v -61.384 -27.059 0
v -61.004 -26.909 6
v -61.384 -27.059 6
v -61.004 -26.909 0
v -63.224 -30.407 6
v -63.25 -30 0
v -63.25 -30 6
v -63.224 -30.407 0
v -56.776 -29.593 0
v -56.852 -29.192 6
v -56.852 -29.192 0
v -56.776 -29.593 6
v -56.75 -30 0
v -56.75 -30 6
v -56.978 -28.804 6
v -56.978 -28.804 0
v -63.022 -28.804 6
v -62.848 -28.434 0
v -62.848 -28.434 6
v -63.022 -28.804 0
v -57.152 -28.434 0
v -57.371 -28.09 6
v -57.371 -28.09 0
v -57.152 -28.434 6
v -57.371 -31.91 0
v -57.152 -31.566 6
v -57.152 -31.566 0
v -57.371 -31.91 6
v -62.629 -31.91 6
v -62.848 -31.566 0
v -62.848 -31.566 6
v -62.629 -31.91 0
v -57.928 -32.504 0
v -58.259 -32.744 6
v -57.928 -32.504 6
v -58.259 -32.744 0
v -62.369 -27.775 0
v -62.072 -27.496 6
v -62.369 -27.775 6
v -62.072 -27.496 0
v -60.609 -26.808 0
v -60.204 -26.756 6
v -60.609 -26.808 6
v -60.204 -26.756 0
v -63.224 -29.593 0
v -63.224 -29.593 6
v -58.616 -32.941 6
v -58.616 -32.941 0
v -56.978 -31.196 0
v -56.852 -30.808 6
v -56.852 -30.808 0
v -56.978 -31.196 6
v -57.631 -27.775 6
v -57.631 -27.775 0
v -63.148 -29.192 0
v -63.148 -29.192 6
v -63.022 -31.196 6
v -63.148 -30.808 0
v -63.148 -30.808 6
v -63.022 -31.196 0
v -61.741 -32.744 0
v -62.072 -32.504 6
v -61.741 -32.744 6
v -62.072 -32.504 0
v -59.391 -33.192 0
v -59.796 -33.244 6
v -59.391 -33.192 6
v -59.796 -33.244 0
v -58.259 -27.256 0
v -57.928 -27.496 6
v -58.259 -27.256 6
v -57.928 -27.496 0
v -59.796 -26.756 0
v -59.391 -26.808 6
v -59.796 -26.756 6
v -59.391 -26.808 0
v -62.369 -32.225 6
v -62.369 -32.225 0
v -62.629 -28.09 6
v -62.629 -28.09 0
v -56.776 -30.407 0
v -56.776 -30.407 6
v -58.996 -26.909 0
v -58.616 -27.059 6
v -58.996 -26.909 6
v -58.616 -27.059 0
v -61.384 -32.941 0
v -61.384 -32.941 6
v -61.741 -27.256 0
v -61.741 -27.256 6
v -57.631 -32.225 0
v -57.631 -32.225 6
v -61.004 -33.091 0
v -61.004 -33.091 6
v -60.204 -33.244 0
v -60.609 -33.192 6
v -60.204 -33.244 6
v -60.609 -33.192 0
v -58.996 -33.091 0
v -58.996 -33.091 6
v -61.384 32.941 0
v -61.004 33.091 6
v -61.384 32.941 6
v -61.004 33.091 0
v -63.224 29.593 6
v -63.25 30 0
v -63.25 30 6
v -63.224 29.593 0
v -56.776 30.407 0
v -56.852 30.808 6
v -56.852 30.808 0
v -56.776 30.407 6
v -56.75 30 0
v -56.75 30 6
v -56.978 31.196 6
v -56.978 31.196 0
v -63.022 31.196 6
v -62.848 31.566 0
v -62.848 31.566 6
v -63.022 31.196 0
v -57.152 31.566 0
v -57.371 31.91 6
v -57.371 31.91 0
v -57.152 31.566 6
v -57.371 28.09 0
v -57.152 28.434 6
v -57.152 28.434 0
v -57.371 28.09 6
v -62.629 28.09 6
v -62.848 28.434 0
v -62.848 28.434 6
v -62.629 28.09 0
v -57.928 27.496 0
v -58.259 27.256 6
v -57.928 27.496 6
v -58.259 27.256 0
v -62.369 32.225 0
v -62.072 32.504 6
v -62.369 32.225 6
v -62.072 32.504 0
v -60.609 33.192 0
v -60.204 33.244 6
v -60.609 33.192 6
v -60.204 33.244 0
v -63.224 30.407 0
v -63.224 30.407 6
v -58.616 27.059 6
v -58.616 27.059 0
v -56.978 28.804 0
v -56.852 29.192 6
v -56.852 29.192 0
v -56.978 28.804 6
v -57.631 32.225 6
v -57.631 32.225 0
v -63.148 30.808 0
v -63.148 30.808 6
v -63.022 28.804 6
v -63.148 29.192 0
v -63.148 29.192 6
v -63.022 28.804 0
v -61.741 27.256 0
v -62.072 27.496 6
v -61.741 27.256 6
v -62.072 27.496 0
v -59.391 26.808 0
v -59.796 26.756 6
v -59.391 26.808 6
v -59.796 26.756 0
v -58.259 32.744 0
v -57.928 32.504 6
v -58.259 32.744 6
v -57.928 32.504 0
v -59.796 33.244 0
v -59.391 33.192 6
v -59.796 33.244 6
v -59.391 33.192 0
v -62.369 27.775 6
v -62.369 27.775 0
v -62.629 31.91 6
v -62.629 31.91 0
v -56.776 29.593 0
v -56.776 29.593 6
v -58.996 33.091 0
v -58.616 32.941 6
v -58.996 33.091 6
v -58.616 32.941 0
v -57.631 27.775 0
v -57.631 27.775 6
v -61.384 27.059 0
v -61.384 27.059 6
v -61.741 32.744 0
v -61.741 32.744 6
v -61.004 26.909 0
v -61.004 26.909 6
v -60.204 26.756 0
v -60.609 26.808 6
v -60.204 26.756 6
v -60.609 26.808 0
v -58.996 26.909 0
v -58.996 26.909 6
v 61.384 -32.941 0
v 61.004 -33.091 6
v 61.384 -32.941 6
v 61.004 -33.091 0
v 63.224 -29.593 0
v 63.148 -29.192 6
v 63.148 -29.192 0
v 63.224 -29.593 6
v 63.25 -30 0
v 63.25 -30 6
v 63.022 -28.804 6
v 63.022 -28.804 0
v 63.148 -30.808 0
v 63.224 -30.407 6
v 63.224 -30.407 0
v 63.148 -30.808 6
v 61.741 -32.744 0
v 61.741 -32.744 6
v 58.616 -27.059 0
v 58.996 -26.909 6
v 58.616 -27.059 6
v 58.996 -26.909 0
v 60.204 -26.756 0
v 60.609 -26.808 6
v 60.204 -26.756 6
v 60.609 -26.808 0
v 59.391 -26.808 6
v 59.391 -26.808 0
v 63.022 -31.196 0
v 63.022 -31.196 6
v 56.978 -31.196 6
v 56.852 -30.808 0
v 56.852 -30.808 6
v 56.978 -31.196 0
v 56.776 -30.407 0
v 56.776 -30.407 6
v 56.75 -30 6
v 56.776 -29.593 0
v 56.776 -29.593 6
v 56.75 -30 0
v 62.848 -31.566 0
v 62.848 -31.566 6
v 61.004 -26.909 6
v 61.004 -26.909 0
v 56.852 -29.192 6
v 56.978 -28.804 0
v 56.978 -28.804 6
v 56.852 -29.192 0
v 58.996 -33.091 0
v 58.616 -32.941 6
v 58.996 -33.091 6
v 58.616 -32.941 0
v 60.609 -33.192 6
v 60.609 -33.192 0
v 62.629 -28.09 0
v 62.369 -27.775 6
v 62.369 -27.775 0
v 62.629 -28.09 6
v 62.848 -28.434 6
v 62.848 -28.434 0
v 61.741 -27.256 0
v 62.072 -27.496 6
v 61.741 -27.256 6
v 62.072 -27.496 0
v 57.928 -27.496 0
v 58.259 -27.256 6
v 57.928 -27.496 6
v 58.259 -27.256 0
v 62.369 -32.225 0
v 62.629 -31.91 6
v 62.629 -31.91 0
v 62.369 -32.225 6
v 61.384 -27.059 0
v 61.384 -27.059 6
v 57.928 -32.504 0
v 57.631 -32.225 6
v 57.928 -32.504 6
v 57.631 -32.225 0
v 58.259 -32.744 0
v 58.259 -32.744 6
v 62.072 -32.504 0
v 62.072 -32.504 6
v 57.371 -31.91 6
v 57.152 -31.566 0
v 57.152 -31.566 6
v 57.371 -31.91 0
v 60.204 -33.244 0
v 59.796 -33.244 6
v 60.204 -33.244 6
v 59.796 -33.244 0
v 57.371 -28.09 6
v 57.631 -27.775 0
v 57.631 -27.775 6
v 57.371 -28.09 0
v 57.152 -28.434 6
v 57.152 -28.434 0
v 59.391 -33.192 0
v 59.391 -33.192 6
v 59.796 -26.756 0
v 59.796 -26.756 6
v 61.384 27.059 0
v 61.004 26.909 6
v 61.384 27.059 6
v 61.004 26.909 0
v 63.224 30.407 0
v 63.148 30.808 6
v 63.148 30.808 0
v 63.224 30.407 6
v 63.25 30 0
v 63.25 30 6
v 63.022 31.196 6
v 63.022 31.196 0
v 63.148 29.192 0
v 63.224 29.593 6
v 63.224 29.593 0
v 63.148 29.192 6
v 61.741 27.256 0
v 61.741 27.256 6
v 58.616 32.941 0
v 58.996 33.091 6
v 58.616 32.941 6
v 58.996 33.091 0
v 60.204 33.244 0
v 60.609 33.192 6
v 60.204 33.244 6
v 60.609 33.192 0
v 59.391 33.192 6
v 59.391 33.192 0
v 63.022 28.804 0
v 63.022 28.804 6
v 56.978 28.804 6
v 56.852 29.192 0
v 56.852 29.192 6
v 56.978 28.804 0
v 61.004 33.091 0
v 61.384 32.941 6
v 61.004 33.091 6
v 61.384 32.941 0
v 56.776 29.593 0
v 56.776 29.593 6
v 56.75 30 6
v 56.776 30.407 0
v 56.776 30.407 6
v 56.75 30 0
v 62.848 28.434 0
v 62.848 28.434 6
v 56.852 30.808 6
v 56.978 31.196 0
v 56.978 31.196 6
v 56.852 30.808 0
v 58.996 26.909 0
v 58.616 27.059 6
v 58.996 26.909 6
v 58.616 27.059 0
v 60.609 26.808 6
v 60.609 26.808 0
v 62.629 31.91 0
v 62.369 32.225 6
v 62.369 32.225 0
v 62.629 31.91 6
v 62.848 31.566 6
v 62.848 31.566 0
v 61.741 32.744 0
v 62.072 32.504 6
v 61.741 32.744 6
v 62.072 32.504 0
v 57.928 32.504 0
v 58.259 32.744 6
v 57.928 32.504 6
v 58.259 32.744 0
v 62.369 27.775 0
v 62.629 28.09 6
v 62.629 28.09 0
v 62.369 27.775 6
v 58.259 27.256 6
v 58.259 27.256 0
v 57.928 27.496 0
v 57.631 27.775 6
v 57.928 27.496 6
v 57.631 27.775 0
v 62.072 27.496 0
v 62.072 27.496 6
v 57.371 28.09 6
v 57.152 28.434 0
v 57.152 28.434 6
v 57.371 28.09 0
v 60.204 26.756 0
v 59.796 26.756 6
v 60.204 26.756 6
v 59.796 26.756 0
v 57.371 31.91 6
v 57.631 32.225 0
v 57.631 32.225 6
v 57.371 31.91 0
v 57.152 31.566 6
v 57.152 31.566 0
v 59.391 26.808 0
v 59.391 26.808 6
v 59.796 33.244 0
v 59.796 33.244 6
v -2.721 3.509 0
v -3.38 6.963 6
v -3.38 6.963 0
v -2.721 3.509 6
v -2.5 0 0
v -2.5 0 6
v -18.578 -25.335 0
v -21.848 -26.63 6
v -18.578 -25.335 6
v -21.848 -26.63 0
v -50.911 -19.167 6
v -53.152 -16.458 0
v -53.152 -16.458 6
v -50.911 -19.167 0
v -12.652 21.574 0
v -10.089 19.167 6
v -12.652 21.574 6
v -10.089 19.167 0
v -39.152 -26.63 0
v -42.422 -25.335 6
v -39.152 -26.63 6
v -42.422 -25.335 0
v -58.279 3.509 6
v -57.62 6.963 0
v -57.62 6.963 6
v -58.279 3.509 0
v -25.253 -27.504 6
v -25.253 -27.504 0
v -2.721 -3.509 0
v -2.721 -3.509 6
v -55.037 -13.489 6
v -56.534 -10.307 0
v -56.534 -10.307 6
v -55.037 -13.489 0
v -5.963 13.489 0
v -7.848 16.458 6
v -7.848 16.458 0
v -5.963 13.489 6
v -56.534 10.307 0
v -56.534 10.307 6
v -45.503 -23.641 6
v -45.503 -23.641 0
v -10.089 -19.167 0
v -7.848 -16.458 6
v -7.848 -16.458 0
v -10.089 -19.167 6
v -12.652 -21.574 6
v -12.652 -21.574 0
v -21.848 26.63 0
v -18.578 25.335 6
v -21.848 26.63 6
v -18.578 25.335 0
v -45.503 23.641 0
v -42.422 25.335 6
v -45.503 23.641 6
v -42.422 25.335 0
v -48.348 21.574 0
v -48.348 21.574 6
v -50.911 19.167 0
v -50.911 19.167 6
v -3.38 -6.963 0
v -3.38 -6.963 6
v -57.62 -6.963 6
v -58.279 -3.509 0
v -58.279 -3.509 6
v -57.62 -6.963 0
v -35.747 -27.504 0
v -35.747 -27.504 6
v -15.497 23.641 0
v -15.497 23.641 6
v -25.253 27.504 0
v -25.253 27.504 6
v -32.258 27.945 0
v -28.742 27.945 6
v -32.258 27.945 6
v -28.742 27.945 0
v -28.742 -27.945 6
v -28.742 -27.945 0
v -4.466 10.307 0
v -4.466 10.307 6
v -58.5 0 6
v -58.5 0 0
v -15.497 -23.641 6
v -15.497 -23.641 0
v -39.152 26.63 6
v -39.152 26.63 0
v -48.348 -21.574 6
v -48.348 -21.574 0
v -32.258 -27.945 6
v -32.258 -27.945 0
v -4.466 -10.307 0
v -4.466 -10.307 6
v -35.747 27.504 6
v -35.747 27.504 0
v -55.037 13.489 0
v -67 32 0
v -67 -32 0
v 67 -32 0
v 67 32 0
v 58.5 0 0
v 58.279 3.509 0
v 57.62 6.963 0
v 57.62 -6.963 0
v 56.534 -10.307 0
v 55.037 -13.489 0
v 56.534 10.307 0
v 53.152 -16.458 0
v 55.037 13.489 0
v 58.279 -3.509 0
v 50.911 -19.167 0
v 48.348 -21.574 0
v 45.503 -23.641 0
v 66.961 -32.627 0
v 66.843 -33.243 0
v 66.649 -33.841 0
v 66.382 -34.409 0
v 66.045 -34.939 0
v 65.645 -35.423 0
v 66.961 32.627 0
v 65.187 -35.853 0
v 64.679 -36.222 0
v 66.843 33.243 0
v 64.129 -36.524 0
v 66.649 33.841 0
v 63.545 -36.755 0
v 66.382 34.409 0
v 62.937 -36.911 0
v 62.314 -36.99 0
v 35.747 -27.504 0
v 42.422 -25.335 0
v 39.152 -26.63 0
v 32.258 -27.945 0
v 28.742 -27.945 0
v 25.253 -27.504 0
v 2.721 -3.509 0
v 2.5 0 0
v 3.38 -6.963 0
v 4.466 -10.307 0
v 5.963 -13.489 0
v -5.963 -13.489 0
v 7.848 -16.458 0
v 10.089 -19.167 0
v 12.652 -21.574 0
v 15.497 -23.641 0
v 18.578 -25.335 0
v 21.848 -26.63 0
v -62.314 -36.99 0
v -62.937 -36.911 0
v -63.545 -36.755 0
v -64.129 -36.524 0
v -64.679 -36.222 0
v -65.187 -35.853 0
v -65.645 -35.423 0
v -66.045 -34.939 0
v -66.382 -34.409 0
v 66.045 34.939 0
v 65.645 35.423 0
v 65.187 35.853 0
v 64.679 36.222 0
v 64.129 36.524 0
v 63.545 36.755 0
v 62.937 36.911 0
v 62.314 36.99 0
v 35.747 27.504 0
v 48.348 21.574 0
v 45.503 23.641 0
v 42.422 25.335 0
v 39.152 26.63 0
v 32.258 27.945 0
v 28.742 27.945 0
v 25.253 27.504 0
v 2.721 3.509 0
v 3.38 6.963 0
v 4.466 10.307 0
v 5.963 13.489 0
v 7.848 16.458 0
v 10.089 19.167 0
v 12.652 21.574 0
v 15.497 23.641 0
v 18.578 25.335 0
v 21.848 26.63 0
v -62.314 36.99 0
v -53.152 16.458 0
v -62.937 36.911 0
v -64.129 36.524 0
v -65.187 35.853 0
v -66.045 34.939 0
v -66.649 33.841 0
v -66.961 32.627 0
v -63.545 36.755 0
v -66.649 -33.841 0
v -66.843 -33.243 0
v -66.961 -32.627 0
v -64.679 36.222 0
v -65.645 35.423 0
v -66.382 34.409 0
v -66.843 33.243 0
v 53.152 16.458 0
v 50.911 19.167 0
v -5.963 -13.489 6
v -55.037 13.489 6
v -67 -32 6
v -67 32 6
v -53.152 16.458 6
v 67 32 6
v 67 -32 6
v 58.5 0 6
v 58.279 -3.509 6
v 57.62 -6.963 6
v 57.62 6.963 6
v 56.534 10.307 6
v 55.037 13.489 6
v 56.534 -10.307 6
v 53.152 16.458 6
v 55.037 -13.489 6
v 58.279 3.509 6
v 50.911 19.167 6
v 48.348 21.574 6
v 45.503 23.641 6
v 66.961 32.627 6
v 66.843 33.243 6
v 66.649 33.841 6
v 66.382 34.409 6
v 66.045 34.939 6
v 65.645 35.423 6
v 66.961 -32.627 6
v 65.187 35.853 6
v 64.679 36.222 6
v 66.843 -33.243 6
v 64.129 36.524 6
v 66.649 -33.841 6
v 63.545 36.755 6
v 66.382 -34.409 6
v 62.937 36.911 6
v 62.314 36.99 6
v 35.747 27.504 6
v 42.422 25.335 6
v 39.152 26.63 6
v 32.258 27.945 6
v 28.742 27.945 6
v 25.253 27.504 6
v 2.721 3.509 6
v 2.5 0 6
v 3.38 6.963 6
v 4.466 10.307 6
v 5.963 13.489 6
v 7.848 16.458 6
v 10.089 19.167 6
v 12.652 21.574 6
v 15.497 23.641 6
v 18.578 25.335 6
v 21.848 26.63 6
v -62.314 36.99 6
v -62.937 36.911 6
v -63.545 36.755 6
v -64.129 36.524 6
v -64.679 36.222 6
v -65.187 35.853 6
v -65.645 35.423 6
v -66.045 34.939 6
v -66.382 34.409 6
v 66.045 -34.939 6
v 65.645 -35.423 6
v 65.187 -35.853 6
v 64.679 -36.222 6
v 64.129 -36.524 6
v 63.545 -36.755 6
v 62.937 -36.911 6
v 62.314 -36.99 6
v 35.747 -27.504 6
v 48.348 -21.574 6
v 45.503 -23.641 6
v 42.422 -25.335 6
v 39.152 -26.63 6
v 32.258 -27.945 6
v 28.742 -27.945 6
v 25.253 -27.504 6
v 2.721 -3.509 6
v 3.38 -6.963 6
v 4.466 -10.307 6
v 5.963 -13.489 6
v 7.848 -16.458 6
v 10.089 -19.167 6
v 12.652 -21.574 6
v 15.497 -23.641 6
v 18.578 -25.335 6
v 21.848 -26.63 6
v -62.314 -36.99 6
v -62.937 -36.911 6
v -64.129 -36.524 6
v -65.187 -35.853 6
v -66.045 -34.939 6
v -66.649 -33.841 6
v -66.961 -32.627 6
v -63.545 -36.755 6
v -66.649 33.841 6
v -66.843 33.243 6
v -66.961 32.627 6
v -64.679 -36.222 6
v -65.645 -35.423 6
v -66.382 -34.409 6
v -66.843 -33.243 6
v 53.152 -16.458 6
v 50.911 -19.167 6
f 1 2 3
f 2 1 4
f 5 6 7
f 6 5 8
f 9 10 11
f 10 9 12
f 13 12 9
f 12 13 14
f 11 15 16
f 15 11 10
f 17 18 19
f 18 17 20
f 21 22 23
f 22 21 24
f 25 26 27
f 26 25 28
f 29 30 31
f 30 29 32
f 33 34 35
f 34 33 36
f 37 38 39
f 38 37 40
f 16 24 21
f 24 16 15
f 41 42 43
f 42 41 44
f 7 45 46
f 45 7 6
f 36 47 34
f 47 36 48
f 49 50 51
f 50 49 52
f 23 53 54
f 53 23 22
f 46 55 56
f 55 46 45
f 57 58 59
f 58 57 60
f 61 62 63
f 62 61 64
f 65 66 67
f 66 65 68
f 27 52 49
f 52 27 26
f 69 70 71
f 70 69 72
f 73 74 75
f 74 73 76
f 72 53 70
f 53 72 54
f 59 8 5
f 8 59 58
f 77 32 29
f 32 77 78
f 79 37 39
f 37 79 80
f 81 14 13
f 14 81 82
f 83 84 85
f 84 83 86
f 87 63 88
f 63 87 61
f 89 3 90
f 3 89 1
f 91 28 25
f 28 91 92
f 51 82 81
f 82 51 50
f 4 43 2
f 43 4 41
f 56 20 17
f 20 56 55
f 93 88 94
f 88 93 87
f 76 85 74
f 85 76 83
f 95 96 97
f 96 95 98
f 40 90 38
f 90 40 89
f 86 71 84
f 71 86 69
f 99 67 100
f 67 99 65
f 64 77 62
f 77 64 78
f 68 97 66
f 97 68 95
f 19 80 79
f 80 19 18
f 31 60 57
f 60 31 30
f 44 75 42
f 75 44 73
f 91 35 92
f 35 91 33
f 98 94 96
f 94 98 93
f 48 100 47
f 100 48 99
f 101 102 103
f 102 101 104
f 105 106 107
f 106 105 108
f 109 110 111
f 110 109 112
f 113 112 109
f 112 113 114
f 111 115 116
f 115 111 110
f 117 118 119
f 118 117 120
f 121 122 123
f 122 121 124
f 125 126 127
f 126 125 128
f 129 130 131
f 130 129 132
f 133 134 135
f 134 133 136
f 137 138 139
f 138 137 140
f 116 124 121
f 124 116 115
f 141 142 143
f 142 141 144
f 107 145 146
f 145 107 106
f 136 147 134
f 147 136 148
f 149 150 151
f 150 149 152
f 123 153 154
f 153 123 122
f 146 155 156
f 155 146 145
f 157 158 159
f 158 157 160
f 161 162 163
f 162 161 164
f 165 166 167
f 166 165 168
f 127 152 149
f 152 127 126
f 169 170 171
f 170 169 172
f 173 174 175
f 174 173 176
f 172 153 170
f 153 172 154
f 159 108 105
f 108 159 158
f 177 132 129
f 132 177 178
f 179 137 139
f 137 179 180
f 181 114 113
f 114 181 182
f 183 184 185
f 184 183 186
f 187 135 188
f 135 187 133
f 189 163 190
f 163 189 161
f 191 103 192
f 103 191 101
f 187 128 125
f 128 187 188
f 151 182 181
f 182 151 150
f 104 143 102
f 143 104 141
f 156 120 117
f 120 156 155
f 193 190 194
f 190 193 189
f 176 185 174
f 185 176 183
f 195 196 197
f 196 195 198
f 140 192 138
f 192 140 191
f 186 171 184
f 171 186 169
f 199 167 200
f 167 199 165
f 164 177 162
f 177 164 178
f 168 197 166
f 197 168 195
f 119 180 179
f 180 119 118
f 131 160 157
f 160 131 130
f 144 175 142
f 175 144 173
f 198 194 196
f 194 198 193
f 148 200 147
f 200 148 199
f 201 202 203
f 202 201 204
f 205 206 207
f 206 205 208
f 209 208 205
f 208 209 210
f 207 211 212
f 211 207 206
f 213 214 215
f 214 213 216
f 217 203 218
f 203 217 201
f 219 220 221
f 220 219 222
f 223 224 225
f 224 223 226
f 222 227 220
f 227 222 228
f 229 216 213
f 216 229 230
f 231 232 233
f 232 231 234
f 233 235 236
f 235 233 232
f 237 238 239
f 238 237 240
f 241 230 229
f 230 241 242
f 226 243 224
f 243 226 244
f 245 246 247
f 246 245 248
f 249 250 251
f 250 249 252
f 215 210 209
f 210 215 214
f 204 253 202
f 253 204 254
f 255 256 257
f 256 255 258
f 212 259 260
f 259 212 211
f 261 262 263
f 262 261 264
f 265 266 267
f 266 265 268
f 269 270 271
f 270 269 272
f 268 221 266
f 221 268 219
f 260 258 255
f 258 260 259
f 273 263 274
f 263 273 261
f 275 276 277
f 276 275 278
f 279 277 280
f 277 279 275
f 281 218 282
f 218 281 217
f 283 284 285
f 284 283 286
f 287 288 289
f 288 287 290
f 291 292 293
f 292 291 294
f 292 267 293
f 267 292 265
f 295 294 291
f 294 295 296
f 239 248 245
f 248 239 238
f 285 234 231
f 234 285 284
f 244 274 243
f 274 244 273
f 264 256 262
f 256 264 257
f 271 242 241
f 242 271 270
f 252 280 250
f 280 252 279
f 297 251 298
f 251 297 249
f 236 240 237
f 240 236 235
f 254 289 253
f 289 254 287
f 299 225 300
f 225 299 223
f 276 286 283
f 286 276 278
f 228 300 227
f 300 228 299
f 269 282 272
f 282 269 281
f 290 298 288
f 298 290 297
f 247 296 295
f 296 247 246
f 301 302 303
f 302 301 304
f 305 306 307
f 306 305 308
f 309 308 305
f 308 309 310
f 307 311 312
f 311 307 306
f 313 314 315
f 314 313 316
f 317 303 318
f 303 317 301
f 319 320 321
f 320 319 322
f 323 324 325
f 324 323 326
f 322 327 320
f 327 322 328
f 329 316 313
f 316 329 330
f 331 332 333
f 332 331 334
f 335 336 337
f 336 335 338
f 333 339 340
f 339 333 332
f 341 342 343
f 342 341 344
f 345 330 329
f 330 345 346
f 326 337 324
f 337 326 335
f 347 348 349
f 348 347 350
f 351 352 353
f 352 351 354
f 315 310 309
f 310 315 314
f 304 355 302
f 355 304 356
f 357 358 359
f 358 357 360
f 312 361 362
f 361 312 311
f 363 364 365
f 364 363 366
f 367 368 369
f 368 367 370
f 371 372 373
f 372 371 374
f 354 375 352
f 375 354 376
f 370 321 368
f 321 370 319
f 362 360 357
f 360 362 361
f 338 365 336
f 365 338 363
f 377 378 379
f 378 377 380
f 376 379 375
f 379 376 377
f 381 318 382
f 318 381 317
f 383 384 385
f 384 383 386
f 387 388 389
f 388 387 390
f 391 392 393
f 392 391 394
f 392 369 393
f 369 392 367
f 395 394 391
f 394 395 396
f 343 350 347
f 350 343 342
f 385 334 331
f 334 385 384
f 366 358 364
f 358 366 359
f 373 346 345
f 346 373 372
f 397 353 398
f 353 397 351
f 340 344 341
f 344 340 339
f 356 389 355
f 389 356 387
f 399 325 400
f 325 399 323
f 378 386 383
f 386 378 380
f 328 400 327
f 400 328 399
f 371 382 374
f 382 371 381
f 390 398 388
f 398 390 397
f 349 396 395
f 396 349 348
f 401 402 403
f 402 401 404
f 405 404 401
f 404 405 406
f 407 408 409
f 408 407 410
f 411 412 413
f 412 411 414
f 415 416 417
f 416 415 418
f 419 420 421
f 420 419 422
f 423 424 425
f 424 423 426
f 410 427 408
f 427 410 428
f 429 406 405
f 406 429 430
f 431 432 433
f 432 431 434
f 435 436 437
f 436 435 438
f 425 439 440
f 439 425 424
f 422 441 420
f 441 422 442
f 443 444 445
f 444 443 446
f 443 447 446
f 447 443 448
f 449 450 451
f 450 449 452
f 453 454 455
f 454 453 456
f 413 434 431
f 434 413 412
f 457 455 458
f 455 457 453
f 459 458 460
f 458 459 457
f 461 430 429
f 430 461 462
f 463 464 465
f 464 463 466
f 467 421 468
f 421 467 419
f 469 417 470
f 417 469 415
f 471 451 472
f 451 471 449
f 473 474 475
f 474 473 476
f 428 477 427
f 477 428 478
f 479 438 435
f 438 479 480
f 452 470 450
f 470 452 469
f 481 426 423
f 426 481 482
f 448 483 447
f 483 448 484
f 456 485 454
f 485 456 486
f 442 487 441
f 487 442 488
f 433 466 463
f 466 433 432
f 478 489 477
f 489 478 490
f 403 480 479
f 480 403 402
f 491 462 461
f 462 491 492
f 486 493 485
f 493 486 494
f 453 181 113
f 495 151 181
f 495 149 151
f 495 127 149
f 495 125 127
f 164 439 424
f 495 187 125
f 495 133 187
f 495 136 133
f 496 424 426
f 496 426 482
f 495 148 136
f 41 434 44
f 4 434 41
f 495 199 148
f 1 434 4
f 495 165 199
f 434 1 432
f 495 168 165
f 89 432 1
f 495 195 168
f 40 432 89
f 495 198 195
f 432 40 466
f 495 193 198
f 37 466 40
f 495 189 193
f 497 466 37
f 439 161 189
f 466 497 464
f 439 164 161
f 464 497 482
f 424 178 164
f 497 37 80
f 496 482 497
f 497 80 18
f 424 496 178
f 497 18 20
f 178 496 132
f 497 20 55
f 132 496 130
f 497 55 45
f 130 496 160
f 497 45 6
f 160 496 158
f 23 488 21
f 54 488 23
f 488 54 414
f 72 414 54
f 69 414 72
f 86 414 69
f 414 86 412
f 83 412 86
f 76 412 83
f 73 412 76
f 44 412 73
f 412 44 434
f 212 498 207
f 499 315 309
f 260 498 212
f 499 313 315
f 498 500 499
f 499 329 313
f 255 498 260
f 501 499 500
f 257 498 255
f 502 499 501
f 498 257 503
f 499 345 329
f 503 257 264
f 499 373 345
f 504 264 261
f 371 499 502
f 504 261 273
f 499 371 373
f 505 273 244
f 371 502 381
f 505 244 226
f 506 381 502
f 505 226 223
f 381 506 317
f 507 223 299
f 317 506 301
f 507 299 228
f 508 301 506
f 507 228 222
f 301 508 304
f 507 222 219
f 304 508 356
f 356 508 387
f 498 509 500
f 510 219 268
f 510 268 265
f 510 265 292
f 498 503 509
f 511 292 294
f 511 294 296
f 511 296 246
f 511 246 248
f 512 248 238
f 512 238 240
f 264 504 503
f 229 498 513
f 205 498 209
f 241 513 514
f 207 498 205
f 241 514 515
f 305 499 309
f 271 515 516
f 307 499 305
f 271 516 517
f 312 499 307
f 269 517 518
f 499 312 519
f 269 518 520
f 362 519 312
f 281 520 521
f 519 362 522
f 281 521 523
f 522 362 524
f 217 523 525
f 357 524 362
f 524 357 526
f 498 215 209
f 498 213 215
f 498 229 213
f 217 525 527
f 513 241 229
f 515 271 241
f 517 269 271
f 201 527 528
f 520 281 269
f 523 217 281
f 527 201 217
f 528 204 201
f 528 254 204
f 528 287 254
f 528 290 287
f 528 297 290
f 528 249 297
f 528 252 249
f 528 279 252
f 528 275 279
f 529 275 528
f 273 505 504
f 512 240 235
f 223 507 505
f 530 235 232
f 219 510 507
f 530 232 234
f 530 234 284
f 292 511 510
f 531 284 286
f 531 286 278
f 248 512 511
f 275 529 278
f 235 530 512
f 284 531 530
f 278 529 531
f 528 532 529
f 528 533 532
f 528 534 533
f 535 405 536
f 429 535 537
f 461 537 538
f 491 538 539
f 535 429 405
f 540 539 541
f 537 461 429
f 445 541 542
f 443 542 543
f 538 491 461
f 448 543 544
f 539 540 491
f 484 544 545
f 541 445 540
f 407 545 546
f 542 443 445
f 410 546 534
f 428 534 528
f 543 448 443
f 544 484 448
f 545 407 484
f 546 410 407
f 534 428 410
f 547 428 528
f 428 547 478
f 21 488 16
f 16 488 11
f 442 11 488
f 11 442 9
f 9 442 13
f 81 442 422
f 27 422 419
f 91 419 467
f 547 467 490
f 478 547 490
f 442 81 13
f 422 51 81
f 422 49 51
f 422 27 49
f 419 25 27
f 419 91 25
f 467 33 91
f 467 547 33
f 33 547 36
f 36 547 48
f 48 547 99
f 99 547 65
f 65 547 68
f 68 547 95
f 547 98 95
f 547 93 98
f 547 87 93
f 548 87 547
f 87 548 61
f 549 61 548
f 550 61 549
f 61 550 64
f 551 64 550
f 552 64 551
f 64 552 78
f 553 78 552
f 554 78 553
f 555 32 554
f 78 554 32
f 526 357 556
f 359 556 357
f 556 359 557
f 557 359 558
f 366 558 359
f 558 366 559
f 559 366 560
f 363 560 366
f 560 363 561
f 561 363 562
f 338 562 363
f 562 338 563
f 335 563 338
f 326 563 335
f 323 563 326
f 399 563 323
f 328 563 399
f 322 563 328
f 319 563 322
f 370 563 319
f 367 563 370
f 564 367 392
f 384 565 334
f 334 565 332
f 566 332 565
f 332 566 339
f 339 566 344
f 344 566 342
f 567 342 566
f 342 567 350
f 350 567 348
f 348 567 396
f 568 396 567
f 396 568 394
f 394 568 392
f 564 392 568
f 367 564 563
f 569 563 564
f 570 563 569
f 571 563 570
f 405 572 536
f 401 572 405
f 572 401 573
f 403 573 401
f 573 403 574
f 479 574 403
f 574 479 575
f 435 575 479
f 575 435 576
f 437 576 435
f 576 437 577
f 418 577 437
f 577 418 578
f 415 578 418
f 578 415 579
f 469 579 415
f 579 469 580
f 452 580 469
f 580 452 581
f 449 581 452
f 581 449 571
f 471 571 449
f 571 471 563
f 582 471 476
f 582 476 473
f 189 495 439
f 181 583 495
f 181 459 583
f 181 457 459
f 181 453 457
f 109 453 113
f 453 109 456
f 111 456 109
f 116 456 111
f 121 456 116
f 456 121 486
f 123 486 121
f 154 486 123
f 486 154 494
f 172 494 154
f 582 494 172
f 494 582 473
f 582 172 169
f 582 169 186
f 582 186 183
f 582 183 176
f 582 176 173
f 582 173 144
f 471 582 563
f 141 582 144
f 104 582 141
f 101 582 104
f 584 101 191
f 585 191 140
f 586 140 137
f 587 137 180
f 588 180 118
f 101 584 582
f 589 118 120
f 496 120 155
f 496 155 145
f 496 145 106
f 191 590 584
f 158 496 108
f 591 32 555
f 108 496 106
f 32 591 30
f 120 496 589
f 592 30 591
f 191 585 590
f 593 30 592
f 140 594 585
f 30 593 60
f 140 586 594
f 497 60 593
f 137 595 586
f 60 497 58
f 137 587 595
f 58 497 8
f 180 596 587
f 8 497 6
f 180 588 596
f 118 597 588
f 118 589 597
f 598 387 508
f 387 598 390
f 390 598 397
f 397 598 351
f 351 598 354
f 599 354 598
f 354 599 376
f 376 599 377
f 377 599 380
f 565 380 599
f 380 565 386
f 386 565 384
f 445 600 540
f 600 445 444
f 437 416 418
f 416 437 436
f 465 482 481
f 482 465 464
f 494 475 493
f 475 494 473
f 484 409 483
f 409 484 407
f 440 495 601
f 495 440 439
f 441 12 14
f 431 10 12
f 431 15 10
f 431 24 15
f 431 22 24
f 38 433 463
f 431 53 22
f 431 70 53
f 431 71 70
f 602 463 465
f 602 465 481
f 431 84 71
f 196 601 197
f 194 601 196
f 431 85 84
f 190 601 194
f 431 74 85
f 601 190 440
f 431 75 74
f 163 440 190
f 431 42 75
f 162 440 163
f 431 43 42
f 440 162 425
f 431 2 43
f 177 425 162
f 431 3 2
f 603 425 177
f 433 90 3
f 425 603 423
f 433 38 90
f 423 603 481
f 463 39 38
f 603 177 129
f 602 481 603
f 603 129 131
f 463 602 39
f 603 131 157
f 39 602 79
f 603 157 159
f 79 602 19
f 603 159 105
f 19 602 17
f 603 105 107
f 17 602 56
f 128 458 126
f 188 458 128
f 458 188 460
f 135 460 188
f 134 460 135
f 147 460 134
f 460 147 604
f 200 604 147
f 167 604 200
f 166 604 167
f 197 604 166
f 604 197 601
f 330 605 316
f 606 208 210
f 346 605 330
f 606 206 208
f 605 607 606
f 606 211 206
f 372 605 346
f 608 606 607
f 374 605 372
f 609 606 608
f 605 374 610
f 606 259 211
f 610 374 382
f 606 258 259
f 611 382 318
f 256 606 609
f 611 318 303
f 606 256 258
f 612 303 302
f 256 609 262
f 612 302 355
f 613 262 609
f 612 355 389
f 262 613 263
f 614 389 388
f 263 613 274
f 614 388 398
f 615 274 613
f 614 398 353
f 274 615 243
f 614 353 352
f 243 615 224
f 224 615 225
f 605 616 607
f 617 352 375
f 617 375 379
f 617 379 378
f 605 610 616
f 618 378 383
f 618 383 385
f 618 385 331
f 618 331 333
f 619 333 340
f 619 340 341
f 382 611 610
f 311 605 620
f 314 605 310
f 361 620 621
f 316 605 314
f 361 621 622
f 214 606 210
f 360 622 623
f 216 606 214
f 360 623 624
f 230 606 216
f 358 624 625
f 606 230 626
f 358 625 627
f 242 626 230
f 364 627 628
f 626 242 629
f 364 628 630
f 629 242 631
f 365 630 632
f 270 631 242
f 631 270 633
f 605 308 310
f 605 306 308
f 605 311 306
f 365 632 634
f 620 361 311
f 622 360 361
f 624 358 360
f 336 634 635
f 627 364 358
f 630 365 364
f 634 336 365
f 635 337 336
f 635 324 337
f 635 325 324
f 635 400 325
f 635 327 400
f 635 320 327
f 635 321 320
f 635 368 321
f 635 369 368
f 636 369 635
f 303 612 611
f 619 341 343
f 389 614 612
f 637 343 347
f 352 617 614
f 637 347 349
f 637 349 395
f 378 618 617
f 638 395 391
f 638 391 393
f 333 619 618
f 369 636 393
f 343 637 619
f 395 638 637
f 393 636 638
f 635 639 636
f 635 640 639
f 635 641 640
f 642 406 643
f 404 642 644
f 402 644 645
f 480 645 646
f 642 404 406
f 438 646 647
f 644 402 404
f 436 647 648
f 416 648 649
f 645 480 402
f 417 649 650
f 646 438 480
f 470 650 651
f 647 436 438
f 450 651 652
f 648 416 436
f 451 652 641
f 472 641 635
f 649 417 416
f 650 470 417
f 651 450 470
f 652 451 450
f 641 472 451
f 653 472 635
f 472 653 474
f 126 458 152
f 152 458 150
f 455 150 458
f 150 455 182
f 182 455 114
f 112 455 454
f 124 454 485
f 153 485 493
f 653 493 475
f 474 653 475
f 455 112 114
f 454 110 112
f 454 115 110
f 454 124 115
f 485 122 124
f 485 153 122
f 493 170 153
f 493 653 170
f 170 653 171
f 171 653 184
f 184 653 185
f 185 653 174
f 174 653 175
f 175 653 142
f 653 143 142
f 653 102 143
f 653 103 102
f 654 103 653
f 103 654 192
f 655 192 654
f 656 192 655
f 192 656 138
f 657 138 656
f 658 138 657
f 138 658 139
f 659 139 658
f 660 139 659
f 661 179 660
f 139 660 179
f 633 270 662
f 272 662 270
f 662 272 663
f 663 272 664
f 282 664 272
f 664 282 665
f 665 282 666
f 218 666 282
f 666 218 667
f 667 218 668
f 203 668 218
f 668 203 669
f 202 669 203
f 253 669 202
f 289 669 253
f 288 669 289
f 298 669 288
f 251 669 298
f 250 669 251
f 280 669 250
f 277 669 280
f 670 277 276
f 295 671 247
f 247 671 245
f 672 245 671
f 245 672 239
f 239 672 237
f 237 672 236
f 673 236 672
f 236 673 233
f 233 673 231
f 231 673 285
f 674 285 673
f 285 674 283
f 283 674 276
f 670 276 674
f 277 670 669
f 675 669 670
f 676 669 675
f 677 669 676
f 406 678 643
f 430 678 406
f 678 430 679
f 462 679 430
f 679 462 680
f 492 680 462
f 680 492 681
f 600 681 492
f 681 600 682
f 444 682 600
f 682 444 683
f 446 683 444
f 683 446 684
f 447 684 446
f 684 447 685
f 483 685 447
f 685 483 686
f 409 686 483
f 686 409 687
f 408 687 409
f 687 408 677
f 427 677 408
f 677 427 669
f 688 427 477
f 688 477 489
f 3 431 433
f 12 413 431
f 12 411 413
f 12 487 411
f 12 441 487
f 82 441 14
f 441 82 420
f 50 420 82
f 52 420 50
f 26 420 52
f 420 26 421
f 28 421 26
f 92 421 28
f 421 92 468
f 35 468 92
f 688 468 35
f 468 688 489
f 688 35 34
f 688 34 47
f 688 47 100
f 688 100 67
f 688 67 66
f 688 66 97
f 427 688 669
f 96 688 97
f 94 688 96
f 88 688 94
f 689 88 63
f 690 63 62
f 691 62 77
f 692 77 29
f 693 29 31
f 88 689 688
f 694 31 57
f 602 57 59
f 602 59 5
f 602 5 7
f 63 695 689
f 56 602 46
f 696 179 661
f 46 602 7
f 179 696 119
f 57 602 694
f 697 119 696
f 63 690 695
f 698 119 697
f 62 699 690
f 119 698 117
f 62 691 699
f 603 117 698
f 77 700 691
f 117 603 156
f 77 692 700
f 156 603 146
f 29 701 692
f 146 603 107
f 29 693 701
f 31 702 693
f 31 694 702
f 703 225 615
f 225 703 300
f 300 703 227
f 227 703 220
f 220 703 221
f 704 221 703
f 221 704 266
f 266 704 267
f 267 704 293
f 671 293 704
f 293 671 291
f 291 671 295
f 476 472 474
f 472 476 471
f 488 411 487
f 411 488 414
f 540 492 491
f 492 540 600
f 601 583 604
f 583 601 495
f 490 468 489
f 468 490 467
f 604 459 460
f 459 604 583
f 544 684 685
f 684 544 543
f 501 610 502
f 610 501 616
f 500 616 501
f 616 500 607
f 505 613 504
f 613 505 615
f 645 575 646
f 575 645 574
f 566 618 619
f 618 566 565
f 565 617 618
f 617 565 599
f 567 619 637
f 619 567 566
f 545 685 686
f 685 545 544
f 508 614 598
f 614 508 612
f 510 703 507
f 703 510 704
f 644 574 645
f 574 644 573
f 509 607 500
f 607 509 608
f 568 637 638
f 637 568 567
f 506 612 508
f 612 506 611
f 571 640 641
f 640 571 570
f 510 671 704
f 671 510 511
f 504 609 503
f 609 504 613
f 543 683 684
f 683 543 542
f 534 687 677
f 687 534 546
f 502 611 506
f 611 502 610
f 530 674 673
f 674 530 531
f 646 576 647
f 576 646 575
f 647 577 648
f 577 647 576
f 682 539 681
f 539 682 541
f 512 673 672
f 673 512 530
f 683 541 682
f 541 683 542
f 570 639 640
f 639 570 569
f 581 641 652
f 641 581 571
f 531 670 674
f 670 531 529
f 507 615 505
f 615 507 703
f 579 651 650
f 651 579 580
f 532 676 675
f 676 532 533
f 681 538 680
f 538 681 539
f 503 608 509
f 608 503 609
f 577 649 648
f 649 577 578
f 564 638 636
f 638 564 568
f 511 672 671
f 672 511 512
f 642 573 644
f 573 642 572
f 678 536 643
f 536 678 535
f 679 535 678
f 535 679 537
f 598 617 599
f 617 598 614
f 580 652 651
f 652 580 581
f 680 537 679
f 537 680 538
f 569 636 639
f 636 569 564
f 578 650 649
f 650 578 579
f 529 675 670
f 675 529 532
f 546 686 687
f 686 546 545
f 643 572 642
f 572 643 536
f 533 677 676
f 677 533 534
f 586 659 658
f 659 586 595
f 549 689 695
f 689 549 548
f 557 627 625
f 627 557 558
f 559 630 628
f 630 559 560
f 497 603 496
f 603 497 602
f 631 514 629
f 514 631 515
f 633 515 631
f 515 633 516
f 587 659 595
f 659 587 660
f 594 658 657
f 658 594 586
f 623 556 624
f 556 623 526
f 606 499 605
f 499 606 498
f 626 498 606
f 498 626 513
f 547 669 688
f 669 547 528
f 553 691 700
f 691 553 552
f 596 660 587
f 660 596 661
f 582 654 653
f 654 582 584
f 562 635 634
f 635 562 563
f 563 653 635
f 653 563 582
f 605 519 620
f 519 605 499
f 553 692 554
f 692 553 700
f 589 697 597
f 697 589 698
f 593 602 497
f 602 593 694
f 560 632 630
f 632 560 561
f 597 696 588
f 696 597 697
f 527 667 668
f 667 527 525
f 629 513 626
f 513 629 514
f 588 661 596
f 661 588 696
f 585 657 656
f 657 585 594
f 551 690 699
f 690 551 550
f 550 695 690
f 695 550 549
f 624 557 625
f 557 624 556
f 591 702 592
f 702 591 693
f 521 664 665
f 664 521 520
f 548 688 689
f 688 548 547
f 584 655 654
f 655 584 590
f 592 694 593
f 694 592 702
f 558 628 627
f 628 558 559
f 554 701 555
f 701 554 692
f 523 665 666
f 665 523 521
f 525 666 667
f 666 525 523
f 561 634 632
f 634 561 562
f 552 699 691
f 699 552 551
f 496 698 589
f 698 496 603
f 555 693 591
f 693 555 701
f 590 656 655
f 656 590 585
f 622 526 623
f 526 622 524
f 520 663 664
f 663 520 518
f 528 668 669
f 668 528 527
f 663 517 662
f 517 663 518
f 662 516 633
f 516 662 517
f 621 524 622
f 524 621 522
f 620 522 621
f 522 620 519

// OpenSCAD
$fn = 50;

difference() {
	union() {
		hull() {
			translate(v = [-62.0, 32.0, 0]) {
				cylinder(h = 6, r = 5);
			}
			translate(v = [62.0, 32.0, 0]) {
				cylinder(h = 6, r = 5);
			}
			translate(v = [-62.0, -32.0, 0]) {
				cylinder(h = 6, r = 5);
			}
			translate(v = [62.0, -32.0, 0]) {
				cylinder(h = 6, r = 5);
			}
		}
	}
	union() {
		translate(v = [-60.0, -30.0, -100.0]) {
			cylinder(h = 200, r = 3.25);
		}
		translate(v = [-60.0, 30.0, -100.0]) {
			cylinder(h = 200, r = 3.25);
		}
		translate(v = [60.0, -30.0, -100.0]) {
			cylinder(h = 200, r = 3.25);
		}
		translate(v = [60.0, 30.0, -100.0]) {
			cylinder(h = 200, r = 3.25);
		}
		translate(v = [-60.0, -30.0, -100.0]) {
			cylinder(h = 200, r = 1.8);
		}
		translate(v = [-60.0, 30.0, -100.0]) {
			cylinder(h = 200, r = 1.8);
		}
		translate(v = [60.0, -30.0, -100.0]) {
			cylinder(h = 200, r = 1.8);
		}
		translate(v = [60.0, 30.0, -100.0]) {
			cylinder(h = 200, r = 1.8);
		}
		translate(v = [-30.5, 0, 0.0]) {
			cylinder(h = 6, r = 28.0);
		}
		translate(v = [30.5, 0, 0.0]) {
			cylinder(h = 6, r = 28.0);
		}
	}
}
